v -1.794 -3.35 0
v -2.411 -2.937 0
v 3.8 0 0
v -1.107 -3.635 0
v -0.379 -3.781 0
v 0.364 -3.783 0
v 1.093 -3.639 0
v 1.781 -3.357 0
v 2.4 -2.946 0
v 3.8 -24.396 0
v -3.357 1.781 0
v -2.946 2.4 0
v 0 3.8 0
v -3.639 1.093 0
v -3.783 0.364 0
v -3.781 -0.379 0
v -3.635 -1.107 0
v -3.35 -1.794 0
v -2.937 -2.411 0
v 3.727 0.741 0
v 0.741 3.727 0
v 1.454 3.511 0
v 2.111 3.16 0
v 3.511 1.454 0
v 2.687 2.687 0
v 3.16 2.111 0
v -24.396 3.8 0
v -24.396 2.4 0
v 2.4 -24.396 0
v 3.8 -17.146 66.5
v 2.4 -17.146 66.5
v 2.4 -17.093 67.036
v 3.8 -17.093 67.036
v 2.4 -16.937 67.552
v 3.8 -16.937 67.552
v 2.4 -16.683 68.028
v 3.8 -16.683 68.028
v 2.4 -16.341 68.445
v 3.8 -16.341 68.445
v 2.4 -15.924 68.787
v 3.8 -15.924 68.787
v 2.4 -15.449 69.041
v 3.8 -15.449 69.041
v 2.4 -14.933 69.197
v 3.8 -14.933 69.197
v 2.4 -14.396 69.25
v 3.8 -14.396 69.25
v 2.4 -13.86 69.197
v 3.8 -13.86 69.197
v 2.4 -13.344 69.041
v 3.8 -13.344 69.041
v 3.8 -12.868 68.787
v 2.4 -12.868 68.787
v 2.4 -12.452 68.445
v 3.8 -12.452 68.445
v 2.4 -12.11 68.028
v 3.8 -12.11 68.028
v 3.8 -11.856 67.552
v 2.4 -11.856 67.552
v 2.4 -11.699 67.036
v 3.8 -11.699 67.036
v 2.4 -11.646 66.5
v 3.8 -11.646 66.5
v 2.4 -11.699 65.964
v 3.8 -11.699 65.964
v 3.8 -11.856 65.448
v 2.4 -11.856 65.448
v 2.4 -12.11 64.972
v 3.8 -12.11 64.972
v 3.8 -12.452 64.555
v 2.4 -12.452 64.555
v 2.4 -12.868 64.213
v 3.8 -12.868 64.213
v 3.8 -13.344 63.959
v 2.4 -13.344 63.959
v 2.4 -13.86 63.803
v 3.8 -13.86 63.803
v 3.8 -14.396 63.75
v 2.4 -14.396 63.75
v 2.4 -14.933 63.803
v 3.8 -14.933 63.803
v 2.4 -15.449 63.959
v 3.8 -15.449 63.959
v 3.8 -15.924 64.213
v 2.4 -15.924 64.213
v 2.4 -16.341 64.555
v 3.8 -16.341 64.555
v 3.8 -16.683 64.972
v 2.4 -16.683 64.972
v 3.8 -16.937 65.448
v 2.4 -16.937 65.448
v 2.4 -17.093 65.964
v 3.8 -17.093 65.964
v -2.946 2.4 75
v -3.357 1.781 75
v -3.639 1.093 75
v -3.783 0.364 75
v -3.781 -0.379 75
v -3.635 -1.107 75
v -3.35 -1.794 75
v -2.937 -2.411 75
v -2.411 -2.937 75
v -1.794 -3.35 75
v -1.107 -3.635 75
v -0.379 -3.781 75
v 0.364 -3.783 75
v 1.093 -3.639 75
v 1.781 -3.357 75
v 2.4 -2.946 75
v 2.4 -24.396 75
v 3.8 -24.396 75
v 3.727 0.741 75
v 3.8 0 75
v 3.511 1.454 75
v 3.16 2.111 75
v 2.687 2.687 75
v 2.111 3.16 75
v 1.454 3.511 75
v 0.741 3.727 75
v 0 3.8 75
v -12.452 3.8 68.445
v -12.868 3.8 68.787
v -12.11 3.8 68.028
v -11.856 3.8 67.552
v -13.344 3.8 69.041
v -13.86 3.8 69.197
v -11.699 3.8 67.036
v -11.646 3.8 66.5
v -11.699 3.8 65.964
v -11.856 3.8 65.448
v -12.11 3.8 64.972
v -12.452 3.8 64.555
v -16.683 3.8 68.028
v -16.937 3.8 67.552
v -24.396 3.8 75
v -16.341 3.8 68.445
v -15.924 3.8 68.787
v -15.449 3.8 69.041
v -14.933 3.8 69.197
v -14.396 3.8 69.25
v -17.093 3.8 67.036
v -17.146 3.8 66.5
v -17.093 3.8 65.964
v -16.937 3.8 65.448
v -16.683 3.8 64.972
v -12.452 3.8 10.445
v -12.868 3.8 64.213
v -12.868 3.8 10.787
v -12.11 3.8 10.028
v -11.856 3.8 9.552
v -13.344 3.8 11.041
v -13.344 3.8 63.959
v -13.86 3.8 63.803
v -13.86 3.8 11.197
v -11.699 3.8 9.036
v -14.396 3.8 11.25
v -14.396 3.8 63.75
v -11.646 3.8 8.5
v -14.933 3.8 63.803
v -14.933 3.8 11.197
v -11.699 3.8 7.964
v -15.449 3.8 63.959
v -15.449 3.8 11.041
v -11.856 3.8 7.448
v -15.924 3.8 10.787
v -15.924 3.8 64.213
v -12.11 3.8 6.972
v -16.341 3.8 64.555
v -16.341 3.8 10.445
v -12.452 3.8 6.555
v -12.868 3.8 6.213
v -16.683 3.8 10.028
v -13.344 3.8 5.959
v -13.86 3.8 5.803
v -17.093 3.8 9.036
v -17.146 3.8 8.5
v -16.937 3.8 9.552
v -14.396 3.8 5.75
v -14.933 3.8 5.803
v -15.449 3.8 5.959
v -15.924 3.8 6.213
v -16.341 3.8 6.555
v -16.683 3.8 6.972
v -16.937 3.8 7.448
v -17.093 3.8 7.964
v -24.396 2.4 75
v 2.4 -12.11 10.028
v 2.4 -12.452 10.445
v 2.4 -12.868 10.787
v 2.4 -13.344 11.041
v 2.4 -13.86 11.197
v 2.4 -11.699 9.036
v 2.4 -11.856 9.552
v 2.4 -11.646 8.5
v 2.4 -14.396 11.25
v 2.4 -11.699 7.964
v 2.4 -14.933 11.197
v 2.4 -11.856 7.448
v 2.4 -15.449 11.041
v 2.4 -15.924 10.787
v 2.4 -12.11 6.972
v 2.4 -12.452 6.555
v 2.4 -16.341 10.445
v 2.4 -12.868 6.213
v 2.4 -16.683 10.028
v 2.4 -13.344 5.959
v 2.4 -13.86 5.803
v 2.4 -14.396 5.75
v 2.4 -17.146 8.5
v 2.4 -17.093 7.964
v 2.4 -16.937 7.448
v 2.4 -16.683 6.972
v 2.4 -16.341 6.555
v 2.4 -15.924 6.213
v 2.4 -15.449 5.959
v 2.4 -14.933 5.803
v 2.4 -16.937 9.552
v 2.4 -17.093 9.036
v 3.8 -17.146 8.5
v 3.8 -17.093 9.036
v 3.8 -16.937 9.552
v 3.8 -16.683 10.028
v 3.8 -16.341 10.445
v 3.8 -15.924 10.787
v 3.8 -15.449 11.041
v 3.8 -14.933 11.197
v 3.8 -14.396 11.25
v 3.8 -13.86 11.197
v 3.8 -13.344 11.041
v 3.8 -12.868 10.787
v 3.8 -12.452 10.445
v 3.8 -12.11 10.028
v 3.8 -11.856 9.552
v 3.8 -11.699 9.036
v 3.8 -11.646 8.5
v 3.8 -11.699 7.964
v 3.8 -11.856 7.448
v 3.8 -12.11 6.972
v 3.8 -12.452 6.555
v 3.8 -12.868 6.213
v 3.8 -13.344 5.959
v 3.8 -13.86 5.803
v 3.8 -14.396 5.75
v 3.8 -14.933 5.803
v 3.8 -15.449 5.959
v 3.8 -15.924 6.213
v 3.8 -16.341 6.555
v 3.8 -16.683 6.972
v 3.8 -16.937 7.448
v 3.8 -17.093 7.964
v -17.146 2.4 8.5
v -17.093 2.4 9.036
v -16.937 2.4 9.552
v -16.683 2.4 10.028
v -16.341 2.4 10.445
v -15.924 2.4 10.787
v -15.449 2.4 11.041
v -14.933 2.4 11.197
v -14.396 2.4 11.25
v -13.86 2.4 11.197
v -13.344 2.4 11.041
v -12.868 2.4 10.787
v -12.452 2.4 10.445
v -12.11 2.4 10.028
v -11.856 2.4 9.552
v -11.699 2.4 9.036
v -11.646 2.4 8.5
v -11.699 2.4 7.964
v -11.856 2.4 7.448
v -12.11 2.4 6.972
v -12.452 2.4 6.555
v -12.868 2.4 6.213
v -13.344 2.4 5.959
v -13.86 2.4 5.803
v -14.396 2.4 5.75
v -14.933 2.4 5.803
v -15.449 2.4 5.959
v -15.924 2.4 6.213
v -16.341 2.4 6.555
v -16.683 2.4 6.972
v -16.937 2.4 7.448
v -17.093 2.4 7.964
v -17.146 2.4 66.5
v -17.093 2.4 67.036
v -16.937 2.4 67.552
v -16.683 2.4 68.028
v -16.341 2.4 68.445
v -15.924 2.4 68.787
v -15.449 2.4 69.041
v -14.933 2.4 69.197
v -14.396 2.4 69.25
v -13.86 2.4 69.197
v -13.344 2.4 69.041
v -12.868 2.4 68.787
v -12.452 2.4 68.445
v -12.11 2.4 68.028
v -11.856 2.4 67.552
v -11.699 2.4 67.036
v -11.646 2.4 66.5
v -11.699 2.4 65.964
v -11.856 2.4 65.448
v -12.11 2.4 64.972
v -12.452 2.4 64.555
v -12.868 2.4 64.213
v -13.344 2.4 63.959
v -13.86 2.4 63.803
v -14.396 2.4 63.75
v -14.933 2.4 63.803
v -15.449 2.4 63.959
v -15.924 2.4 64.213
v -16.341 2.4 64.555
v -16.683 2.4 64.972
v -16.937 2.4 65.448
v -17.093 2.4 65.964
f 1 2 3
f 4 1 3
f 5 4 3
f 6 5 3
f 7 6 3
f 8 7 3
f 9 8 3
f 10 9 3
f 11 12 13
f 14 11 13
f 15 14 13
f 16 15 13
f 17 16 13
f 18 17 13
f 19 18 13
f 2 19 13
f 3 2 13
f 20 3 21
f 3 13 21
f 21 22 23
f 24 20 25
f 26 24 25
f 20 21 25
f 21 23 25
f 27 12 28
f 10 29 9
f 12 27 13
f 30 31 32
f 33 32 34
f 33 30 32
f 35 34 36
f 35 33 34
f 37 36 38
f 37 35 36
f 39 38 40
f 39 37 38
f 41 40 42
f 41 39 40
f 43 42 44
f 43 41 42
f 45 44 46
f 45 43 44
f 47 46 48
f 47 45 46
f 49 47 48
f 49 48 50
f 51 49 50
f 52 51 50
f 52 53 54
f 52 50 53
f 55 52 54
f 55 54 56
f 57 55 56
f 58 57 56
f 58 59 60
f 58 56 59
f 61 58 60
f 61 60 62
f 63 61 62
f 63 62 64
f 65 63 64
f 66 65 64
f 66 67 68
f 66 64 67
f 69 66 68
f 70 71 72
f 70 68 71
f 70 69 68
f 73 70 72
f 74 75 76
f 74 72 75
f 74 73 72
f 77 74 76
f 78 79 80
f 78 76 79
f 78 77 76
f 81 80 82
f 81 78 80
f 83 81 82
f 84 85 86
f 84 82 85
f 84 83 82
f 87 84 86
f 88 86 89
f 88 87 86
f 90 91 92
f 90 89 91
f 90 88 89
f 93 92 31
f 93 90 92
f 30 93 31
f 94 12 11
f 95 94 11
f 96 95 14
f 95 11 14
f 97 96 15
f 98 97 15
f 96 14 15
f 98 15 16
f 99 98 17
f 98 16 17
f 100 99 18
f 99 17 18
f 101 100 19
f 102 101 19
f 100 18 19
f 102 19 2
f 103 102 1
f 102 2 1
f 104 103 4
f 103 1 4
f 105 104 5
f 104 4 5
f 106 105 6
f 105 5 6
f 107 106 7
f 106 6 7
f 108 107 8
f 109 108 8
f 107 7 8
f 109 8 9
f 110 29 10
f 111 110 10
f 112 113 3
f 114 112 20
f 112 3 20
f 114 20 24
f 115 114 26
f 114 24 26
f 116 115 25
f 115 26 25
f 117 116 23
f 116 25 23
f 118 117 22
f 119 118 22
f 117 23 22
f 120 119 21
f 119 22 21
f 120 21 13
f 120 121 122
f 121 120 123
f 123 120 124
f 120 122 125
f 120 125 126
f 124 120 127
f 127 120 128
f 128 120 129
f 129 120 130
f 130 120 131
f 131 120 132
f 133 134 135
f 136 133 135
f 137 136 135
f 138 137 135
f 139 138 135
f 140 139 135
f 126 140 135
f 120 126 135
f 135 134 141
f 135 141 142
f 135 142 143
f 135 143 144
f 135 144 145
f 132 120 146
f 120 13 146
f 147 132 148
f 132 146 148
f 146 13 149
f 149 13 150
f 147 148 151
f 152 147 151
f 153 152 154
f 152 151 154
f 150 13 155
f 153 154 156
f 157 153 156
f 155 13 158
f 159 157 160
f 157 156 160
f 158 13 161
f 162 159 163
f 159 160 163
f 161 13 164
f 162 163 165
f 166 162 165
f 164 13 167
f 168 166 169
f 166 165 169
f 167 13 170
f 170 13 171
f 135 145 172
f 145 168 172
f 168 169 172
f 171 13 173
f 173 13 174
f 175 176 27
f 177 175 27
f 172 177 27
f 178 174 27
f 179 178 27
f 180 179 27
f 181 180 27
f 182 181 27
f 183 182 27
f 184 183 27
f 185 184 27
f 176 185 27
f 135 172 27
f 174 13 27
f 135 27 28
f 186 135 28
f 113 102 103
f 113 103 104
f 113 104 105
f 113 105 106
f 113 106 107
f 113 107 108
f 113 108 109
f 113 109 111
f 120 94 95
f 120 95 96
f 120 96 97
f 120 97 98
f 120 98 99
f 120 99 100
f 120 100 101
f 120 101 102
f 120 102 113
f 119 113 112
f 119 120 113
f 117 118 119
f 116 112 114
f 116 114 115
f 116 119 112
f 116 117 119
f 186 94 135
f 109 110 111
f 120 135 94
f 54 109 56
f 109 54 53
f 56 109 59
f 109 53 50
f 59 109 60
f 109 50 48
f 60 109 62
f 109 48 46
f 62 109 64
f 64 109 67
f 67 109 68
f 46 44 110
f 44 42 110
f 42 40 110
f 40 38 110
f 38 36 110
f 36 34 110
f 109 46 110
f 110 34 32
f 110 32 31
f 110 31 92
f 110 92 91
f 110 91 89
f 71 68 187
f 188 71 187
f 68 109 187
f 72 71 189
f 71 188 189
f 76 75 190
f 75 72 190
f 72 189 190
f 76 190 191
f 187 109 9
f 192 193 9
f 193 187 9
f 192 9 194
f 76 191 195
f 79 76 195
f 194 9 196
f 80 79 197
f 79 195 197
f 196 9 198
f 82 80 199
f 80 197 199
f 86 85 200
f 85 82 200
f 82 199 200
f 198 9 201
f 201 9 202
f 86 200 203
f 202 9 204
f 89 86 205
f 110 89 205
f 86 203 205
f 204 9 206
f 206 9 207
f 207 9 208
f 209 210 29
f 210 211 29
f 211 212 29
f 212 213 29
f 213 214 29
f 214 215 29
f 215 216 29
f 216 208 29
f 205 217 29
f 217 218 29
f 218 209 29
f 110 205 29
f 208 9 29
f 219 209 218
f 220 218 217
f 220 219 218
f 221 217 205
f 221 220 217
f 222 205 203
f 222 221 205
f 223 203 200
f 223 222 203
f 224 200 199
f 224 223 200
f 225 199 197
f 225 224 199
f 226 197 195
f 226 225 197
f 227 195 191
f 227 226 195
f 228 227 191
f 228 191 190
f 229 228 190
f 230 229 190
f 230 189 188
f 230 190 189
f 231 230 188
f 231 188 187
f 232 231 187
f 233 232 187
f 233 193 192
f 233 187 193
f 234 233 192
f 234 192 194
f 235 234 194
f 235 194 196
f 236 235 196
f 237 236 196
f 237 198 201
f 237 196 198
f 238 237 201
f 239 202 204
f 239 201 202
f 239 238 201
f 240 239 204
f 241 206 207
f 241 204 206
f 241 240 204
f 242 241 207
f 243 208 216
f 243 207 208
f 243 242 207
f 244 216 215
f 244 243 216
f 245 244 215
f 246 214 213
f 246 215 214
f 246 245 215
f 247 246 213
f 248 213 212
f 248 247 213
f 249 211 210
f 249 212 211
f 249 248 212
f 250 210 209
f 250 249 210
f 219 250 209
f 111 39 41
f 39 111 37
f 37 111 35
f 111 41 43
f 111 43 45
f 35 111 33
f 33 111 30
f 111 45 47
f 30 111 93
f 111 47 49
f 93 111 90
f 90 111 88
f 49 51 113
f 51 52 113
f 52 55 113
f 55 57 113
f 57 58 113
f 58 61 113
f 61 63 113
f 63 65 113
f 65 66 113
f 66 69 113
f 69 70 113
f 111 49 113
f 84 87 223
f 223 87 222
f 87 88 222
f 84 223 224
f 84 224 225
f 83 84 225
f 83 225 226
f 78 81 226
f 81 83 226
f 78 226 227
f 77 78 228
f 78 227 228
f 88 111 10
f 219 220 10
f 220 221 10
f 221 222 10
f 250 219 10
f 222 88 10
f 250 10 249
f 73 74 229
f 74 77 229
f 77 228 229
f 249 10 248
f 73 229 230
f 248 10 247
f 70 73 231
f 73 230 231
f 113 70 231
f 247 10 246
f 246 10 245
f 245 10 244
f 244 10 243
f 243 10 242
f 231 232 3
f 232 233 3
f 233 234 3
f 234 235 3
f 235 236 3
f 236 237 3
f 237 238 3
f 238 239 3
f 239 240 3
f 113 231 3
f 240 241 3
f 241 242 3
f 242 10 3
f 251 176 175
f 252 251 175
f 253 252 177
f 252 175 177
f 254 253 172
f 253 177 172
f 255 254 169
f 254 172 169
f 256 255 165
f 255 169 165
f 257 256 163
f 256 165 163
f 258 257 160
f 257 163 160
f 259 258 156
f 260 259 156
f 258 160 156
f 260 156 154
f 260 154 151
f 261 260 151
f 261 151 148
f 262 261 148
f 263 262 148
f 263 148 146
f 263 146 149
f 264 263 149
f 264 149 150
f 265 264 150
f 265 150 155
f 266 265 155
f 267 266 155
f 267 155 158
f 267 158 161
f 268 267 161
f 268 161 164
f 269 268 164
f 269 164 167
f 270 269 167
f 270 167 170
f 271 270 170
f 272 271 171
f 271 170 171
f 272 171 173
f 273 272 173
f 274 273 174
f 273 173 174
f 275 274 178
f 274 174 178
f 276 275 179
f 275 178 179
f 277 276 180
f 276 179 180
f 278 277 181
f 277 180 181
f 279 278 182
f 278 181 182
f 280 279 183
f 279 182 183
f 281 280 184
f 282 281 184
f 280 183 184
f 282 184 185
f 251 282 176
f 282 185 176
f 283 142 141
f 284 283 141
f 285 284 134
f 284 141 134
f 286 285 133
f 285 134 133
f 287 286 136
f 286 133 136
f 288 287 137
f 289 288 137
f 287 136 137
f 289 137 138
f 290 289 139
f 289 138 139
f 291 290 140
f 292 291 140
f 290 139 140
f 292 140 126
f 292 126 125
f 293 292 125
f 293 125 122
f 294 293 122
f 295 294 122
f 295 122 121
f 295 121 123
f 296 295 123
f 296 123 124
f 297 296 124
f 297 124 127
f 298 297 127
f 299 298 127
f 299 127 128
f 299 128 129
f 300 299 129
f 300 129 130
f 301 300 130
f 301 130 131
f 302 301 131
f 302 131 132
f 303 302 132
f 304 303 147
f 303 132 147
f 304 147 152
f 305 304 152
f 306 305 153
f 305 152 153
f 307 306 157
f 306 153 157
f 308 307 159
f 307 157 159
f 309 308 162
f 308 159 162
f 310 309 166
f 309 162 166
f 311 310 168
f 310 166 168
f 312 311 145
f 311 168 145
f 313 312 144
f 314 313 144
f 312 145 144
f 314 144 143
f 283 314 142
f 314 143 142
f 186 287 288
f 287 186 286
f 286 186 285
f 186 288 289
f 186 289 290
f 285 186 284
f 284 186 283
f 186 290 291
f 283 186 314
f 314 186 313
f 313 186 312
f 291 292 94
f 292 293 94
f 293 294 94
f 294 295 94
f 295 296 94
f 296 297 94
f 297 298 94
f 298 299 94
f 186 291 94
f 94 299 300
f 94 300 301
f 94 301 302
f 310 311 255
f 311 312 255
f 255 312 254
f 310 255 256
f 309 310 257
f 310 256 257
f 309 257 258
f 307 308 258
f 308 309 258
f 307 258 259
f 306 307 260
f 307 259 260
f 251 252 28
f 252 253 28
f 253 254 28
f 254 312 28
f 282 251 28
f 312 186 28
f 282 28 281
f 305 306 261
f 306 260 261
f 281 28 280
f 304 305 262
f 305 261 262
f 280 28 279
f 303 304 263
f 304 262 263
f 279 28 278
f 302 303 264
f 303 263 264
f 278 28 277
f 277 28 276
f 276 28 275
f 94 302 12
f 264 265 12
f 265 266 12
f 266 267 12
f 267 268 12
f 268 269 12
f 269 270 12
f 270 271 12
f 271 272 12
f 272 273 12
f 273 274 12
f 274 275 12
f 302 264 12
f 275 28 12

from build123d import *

# Parameters (mm, degrees)
EXTRUDE_1_DEPTH     = 75
SKETCH_2_R          = 2.75
CUT_EXTRUDE_1_DEPTH = 75


with BuildPart() as part:
    # 草图1 → 凸台-拉伸1 (new body)
    with BuildSketch(Plane.XY):
        with BuildLine():
            Line((-24.396183973, 2.4), (-2.946183973, 2.4))
            ThreePointArc((-2.946183973, 2.4), (-2.687005769, -2.687005769), (2.4, -2.946183973))
            Line((2.4, -2.946183973), (2.4, -24.396183973))
            Line((2.4, -24.396183973), (3.8, -24.396183973))
            Line((3.8, -24.396183973), (3.8, 0))
            ThreePointArc((3.8, 0), (2.687005769, 2.687005769), (0, 3.8))
            Line((0, 3.8), (-24.396183973, 3.8))
            Line((-24.396183973, 3.8), (-24.396183973, 2.4))
        make_face()
    extrude(amount=EXTRUDE_1_DEPTH)

    # 草图2 → 切除-拉伸1 (cut)
    with BuildSketch(Plane(origin=(0, 3.8, 0), x_dir=(1, 0, 0), z_dir=(0, 1, 0))):
        with Locations(Location((-14.396183973, -8.5, 0), (0, 0, 180))):
            Circle(SKETCH_2_R)
        with Locations(Location((-14.396183973, -66.5, 0), (0, 0, 180))):
            Circle(SKETCH_2_R)
    cut_extrude_1 = extrude(amount=-CUT_EXTRUDE_1_DEPTH, mode=Mode.SUBTRACT)

    # 镜向1: 切除-拉伸1 across plane
    add(cut_extrude_1.mirror(Plane(origin=(0, 0, 0), x_dir=(0, 0, 1), z_dir=(-0.7071067811865488, 0.7071067811865464, 0))), mode=Mode.SUBTRACT)


solid = part.part
